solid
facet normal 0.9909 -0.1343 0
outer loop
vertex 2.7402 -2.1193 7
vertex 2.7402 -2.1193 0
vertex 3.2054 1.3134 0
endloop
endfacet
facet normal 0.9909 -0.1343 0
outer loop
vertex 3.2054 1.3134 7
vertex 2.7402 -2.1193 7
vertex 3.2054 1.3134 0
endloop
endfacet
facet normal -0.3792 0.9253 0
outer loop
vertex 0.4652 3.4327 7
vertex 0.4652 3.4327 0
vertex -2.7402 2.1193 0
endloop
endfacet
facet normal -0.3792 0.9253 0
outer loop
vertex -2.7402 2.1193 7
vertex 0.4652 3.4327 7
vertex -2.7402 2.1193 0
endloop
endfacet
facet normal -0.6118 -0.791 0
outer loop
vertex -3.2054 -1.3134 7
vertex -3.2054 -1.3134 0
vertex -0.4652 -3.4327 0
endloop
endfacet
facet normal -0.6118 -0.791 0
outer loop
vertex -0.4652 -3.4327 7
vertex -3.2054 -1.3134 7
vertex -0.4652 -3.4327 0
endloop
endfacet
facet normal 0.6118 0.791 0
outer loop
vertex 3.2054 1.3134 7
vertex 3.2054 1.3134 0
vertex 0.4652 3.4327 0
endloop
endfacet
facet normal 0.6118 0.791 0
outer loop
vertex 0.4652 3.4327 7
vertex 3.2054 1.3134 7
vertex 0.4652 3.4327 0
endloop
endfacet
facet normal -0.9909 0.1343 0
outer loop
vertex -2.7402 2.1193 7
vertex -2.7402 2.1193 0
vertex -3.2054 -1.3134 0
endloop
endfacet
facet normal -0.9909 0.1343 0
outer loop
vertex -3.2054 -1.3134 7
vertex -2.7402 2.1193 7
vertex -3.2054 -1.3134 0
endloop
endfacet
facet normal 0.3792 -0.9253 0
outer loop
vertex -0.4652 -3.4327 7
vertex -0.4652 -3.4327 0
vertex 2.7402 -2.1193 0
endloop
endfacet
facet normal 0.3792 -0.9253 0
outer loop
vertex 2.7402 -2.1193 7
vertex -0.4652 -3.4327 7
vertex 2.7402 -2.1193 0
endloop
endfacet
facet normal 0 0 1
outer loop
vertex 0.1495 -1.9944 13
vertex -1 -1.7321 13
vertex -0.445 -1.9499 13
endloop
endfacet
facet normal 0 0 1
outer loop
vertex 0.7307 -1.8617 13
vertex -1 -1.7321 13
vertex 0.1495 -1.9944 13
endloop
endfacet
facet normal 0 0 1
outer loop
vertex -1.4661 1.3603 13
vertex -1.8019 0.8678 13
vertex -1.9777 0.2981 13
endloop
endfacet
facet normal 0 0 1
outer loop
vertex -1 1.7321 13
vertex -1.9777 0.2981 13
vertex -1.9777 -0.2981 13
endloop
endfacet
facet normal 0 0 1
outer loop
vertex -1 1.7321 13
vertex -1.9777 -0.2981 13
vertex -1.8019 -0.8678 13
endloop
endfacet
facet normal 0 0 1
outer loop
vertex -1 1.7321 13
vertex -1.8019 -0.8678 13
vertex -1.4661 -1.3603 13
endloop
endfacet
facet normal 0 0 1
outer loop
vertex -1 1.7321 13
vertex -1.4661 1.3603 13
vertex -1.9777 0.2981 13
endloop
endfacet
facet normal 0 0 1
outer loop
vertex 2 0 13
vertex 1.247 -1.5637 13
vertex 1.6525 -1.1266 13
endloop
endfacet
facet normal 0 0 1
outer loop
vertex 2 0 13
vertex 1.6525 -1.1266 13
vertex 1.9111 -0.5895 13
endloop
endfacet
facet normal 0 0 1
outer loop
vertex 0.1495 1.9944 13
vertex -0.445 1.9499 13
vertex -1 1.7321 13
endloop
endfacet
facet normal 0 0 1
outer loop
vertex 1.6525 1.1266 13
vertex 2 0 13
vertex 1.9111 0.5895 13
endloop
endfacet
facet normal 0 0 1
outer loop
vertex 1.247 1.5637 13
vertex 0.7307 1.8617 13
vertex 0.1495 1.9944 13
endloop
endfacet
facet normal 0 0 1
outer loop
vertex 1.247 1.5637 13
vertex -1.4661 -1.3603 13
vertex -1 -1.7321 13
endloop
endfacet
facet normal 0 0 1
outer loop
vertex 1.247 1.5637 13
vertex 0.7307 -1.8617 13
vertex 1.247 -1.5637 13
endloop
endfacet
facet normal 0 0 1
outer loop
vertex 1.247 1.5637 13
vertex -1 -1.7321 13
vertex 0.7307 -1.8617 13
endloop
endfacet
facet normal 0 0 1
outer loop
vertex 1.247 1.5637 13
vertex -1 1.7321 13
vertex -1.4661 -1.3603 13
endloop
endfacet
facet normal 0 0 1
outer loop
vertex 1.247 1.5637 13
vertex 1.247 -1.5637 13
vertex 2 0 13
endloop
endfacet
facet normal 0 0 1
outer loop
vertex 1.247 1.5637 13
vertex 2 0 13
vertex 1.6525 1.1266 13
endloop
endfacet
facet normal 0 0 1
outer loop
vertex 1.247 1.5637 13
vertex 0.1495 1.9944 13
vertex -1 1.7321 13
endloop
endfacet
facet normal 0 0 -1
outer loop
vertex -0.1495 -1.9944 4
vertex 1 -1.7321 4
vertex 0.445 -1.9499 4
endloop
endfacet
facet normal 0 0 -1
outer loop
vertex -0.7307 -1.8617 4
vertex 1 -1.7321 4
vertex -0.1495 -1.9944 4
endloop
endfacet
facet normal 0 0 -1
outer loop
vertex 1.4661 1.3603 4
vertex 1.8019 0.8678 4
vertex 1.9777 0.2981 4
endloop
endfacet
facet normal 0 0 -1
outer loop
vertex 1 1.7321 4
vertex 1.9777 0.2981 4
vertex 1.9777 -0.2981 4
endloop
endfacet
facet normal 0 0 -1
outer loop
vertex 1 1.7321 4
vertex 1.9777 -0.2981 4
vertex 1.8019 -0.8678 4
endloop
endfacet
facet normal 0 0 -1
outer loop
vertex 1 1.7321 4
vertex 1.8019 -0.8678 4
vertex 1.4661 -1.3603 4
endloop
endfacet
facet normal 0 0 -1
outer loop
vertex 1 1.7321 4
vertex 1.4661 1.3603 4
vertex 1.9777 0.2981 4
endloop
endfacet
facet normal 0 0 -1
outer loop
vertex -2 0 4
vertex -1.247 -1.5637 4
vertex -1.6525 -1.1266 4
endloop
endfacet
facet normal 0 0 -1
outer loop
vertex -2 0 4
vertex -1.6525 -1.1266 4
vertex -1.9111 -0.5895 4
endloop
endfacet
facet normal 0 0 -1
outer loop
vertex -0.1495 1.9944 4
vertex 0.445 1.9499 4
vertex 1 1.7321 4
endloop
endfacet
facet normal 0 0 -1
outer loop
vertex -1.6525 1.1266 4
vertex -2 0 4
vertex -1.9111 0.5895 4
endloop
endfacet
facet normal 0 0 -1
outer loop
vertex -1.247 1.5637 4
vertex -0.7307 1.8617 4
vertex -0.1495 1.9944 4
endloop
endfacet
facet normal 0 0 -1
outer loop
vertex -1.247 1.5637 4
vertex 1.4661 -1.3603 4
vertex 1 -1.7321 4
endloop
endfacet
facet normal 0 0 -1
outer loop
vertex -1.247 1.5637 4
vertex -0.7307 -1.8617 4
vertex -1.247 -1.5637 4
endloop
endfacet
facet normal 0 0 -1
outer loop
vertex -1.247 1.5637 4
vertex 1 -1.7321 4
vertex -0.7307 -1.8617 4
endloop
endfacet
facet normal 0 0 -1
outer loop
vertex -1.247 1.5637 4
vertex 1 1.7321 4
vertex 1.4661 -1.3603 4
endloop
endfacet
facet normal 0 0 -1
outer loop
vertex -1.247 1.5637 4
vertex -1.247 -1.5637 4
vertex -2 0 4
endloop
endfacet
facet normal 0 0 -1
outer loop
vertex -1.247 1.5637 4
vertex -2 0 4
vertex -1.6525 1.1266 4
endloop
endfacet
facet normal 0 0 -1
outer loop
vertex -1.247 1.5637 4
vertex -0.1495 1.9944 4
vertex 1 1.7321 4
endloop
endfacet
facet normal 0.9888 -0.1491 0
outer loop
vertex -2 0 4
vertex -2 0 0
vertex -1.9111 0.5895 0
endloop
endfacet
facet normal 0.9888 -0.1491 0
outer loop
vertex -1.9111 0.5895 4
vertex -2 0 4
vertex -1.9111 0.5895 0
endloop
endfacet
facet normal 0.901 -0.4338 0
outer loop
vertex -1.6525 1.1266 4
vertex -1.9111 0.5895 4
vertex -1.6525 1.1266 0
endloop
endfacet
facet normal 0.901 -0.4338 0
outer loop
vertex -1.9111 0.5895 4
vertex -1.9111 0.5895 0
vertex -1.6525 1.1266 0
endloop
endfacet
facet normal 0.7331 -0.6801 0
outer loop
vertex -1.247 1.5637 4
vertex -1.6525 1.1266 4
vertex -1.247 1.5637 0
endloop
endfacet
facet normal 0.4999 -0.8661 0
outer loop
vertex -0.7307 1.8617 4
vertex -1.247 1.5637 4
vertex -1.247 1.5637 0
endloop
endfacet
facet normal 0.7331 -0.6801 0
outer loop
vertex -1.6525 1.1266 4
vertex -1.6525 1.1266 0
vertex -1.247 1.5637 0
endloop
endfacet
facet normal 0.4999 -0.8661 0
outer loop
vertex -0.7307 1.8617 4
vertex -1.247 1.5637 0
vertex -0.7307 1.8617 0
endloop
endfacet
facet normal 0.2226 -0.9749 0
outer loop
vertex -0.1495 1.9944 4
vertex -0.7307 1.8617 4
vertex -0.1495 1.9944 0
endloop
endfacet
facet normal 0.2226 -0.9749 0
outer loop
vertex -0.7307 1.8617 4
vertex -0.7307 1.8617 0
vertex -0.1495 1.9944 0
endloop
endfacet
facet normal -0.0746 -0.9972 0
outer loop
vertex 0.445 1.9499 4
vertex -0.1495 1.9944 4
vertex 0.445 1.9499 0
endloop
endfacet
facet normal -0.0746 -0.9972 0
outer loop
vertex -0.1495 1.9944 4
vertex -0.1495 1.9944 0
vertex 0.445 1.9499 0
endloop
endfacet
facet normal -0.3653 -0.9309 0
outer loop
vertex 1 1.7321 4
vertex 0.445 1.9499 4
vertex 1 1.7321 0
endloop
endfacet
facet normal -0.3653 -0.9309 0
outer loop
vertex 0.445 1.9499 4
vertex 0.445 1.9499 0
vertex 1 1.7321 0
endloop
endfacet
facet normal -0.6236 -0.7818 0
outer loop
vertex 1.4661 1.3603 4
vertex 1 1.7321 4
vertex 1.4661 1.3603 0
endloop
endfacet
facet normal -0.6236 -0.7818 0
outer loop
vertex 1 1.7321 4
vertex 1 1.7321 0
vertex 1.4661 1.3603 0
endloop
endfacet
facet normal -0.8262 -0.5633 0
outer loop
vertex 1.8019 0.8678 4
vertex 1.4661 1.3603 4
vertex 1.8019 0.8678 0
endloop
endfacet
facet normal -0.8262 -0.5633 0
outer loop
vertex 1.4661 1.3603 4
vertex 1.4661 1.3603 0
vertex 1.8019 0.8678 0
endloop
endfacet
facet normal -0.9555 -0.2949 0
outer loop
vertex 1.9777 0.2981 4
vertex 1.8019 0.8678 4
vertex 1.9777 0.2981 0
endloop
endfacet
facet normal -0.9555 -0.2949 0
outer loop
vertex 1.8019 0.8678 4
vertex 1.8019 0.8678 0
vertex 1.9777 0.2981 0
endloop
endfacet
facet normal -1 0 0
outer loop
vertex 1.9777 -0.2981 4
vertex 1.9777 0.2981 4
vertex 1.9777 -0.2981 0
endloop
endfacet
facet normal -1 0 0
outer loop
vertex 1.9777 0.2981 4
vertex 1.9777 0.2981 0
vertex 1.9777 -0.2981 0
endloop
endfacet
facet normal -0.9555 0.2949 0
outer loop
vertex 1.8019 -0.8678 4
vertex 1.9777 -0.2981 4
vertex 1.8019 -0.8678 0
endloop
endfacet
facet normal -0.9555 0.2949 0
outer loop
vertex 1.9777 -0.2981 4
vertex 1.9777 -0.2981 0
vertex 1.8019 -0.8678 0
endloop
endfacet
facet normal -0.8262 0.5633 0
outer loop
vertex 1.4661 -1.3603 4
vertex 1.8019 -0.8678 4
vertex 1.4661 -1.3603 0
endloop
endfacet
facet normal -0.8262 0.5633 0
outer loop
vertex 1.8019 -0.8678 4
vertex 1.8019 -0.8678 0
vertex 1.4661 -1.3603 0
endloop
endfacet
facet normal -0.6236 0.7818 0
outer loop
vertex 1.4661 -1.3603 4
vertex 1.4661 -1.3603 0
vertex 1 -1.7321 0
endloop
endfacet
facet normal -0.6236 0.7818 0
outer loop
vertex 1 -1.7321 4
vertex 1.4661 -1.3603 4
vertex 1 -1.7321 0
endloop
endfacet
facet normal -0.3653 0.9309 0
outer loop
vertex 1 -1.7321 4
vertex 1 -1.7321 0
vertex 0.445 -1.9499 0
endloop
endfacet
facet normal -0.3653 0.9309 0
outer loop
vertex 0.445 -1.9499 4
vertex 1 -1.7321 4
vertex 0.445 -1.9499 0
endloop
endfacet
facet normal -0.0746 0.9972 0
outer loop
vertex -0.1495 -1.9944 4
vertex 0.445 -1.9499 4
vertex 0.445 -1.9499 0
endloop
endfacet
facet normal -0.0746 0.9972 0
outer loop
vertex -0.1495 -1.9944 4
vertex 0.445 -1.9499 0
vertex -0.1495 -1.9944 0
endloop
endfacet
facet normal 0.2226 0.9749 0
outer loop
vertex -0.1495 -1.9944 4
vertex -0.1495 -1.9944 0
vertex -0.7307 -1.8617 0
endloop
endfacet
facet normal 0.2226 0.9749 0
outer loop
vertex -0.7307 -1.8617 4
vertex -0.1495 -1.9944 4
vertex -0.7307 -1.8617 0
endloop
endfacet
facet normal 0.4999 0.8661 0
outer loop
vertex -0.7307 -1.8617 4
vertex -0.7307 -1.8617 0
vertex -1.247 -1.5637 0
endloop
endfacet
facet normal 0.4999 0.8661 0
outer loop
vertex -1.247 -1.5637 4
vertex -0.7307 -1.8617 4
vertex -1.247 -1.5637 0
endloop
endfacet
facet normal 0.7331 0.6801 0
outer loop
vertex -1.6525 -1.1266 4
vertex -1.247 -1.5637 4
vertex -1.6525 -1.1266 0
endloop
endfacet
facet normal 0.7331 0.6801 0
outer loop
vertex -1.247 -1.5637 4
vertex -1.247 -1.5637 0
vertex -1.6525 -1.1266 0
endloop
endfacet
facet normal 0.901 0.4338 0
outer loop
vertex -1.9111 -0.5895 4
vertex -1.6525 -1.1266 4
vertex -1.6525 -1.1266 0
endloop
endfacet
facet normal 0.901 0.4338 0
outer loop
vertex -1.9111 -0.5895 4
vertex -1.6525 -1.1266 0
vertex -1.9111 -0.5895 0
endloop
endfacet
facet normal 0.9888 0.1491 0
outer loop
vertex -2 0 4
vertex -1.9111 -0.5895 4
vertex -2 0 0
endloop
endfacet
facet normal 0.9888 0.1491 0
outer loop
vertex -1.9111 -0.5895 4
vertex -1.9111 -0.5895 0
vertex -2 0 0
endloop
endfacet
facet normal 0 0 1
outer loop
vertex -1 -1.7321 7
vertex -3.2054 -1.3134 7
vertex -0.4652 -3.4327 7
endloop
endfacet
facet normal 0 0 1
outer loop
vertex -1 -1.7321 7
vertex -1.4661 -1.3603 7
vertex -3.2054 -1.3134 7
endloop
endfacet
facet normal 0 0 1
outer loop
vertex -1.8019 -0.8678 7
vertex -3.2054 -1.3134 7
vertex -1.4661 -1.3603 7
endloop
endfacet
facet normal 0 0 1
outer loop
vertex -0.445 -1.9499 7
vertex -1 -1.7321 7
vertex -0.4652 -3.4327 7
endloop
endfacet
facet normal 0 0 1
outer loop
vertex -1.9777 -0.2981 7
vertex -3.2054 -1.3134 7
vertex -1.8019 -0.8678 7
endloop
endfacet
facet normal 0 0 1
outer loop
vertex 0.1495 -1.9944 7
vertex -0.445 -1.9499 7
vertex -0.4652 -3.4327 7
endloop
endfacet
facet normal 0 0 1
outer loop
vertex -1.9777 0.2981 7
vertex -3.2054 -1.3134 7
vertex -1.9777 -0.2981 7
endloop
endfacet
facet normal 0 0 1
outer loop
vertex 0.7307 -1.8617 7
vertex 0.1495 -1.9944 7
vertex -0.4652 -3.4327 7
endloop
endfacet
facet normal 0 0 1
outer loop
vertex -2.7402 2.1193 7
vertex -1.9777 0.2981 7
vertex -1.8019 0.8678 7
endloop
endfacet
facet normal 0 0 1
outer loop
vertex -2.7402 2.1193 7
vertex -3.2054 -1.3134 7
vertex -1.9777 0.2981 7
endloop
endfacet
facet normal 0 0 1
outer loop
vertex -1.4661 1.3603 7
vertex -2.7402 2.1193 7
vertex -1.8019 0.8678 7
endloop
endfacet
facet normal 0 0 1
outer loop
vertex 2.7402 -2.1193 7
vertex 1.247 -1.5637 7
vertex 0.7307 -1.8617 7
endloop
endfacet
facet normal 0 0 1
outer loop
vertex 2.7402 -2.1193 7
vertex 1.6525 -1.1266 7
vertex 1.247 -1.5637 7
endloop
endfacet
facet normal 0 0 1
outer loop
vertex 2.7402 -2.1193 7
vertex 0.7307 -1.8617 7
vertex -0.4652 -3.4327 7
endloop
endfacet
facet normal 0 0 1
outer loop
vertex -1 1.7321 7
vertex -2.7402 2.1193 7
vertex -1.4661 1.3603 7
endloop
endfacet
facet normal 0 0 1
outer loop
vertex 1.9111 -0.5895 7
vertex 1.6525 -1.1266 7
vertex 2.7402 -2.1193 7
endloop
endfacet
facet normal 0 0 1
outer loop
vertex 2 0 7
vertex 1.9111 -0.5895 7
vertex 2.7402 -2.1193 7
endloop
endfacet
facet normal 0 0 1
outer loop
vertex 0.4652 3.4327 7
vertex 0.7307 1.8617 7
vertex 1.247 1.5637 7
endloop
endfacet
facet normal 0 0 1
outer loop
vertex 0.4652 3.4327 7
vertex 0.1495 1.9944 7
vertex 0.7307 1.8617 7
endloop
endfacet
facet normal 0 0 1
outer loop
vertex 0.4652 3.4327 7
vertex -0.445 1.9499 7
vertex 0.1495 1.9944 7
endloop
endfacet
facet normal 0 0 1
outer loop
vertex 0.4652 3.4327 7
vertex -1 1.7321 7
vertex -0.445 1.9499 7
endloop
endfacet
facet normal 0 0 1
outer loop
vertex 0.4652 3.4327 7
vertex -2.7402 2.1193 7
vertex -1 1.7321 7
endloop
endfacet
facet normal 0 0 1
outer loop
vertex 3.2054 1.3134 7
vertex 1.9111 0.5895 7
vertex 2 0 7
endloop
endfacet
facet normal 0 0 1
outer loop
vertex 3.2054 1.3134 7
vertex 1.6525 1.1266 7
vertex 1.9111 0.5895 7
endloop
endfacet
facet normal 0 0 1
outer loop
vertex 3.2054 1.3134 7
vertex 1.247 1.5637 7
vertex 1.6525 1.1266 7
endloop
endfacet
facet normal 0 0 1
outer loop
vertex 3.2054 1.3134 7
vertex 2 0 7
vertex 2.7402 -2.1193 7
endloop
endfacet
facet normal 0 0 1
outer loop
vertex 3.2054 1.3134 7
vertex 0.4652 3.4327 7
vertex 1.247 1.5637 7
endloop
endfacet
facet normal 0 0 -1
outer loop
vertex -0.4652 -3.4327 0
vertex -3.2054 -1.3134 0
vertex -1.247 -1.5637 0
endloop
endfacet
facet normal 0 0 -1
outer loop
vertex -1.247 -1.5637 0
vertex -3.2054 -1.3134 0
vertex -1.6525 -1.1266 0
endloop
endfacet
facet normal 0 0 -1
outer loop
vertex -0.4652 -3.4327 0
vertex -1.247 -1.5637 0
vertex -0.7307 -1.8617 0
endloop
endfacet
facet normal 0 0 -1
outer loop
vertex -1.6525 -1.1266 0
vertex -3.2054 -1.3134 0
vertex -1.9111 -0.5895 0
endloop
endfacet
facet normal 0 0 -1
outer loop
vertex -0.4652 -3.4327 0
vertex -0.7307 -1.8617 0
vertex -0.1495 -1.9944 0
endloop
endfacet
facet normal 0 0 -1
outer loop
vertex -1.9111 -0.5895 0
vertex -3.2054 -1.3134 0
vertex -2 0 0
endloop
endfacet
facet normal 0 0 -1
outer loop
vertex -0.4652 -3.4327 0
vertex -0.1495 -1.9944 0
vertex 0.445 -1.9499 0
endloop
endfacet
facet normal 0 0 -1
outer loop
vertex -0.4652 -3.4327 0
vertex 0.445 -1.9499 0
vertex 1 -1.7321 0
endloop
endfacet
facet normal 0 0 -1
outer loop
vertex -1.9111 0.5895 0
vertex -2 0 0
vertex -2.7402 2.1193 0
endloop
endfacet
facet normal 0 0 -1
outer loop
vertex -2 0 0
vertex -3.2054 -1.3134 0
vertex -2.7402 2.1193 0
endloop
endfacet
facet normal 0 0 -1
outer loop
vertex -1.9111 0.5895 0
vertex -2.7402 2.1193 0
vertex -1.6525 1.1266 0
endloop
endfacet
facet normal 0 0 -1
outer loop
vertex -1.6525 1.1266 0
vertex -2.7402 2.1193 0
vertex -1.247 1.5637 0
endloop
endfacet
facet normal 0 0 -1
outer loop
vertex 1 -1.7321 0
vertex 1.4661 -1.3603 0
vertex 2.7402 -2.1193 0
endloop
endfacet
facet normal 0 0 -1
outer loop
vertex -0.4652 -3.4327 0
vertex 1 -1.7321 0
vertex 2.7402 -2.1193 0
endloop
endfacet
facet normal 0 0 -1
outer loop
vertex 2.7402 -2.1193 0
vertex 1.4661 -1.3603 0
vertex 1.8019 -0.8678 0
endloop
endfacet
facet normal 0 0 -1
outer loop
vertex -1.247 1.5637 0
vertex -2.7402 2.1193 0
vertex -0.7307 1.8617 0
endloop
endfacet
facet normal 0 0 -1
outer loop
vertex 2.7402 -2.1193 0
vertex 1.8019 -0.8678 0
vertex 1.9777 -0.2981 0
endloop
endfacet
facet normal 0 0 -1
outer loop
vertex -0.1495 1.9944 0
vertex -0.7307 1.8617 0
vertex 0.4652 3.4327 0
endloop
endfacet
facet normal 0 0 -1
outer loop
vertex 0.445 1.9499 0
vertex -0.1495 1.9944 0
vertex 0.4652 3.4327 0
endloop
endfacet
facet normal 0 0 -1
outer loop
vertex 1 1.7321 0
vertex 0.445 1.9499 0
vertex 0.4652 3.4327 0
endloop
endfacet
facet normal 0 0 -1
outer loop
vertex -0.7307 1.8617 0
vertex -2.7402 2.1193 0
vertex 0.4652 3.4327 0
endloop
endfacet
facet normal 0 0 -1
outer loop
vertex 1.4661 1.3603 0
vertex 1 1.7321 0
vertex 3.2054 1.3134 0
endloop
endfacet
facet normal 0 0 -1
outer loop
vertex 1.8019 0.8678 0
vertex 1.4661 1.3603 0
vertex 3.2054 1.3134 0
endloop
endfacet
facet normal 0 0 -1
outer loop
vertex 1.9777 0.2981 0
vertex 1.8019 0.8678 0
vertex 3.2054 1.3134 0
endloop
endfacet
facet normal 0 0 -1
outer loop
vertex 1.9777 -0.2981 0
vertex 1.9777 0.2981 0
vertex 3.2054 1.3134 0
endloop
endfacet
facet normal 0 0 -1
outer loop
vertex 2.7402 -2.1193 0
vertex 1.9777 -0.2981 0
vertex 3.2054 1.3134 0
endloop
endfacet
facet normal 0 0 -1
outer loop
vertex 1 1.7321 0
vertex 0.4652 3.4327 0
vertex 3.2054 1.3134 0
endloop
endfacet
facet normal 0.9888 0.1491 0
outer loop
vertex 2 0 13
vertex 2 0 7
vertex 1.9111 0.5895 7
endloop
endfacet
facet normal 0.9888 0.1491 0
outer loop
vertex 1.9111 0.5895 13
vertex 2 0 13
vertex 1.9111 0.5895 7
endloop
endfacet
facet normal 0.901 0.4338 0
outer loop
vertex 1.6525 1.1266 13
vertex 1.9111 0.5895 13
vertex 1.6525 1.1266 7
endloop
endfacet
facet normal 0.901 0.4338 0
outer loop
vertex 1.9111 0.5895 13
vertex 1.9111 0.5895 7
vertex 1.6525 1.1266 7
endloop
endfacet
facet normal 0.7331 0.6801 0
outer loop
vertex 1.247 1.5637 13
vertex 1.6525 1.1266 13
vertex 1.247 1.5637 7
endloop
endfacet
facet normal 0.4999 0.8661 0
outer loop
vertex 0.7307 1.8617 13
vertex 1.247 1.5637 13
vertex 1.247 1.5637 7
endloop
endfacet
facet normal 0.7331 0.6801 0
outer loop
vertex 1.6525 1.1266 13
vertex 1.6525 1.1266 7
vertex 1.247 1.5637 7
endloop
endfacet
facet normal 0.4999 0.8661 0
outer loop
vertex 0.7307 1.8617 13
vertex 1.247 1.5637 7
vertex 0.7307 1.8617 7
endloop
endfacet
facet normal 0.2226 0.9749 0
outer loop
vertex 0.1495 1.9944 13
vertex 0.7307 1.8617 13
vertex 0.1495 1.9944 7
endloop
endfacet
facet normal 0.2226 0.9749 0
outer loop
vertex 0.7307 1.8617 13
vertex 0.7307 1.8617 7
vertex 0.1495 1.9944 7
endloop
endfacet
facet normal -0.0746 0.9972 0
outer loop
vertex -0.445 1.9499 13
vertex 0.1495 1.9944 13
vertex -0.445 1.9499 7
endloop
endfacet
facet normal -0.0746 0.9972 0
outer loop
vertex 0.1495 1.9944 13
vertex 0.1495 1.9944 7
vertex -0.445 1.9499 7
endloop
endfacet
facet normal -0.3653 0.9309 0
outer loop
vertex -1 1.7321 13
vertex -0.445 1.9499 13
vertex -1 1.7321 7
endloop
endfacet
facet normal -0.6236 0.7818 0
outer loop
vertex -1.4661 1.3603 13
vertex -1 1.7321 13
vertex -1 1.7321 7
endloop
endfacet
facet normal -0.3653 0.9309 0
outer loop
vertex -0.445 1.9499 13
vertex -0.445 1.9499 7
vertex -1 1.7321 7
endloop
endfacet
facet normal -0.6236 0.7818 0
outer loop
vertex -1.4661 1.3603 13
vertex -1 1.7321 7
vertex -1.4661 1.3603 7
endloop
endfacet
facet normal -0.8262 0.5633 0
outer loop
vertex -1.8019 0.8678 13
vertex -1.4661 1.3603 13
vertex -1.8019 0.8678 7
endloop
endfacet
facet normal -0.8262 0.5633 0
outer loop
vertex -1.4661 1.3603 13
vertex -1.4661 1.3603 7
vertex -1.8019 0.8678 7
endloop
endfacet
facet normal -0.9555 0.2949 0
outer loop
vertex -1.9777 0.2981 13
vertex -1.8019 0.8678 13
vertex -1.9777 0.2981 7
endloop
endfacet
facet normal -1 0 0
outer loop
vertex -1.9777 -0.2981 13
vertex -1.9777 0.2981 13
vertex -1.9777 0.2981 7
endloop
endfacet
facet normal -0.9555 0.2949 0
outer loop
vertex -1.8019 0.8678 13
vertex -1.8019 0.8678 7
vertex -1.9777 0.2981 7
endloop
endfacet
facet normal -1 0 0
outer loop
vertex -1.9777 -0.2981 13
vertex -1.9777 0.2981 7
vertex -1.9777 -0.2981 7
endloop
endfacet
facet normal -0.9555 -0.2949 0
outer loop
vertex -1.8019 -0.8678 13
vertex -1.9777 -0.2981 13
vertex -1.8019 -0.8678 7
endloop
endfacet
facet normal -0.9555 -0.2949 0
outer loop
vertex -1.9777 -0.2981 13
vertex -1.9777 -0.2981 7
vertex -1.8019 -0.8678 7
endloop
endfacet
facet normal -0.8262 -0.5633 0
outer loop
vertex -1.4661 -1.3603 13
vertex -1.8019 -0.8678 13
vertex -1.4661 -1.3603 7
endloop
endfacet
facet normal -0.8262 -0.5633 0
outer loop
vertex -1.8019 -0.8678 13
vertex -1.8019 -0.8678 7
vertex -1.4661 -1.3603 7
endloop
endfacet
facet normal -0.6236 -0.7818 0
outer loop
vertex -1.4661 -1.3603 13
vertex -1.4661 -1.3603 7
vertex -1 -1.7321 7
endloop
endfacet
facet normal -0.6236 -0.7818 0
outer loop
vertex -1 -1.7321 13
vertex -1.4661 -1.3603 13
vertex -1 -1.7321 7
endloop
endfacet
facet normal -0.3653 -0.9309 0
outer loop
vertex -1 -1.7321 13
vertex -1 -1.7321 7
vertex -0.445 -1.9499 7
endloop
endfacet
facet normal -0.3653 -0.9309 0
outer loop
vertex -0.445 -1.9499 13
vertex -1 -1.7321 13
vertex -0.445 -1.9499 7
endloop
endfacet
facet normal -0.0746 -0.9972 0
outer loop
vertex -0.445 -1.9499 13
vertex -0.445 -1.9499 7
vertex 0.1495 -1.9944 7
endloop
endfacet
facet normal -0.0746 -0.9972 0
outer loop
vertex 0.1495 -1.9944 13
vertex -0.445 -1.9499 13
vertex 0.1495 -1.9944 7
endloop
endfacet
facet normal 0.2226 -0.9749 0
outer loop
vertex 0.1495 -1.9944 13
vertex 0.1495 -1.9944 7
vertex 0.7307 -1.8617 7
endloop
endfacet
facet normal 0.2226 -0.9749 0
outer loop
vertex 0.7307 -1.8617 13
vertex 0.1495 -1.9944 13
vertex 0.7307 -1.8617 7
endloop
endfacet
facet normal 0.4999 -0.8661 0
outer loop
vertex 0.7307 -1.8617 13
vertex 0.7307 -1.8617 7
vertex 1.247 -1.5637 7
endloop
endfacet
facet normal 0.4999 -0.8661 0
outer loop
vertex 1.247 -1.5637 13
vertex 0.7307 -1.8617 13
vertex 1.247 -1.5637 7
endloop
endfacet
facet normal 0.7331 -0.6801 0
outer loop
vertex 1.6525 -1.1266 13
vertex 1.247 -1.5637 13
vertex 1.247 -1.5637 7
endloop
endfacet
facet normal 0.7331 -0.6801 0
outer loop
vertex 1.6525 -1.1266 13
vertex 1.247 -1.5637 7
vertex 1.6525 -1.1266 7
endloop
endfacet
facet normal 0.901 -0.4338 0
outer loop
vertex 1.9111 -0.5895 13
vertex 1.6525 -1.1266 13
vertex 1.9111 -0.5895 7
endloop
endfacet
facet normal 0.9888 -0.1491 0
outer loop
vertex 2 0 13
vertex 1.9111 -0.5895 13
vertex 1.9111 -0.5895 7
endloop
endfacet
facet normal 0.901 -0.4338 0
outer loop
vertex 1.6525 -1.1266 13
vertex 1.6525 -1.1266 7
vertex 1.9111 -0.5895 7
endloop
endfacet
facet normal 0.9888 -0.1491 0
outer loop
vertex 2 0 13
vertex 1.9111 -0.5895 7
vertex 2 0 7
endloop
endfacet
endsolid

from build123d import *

# Parameters (mm, degrees)
EXTRUDE_1_DEPTH     = 7
SKETCH_2_R          = 2
EXTRUDE_2_DEPTH     = 6
SKETCH_3_R          = 2
CUT_EXTRUDE_1_DEPTH = 4


with BuildPart() as part:
    # 草图1 → 凸台-拉伸1 (new body)
    with BuildSketch(Plane.XY):
        Polygon((2.740200821, -2.119268615), (3.205440868, 1.313449215), (0.465240048, 3.43271783), (-2.740200821, 2.119268615), (-3.205440868, -1.313449215), (-0.465240048, -3.43271783), align=None)
    extrude(amount=EXTRUDE_1_DEPTH)

    # 草图2 → 凸台-拉伸2 (add)
    with BuildSketch(Plane.XY.offset(7)):
        Circle(SKETCH_2_R)
    extrude(amount=EXTRUDE_2_DEPTH)

    # 草图3 → 切除-拉伸1 (cut)
    with BuildSketch(Plane(origin=(0, 0, 0), x_dir=(-1, 0, 0), z_dir=(0, 0, -1))):
        Circle(SKETCH_3_R)
    extrude(amount=-CUT_EXTRUDE_1_DEPTH, mode=Mode.SUBTRACT)


solid = part.part
